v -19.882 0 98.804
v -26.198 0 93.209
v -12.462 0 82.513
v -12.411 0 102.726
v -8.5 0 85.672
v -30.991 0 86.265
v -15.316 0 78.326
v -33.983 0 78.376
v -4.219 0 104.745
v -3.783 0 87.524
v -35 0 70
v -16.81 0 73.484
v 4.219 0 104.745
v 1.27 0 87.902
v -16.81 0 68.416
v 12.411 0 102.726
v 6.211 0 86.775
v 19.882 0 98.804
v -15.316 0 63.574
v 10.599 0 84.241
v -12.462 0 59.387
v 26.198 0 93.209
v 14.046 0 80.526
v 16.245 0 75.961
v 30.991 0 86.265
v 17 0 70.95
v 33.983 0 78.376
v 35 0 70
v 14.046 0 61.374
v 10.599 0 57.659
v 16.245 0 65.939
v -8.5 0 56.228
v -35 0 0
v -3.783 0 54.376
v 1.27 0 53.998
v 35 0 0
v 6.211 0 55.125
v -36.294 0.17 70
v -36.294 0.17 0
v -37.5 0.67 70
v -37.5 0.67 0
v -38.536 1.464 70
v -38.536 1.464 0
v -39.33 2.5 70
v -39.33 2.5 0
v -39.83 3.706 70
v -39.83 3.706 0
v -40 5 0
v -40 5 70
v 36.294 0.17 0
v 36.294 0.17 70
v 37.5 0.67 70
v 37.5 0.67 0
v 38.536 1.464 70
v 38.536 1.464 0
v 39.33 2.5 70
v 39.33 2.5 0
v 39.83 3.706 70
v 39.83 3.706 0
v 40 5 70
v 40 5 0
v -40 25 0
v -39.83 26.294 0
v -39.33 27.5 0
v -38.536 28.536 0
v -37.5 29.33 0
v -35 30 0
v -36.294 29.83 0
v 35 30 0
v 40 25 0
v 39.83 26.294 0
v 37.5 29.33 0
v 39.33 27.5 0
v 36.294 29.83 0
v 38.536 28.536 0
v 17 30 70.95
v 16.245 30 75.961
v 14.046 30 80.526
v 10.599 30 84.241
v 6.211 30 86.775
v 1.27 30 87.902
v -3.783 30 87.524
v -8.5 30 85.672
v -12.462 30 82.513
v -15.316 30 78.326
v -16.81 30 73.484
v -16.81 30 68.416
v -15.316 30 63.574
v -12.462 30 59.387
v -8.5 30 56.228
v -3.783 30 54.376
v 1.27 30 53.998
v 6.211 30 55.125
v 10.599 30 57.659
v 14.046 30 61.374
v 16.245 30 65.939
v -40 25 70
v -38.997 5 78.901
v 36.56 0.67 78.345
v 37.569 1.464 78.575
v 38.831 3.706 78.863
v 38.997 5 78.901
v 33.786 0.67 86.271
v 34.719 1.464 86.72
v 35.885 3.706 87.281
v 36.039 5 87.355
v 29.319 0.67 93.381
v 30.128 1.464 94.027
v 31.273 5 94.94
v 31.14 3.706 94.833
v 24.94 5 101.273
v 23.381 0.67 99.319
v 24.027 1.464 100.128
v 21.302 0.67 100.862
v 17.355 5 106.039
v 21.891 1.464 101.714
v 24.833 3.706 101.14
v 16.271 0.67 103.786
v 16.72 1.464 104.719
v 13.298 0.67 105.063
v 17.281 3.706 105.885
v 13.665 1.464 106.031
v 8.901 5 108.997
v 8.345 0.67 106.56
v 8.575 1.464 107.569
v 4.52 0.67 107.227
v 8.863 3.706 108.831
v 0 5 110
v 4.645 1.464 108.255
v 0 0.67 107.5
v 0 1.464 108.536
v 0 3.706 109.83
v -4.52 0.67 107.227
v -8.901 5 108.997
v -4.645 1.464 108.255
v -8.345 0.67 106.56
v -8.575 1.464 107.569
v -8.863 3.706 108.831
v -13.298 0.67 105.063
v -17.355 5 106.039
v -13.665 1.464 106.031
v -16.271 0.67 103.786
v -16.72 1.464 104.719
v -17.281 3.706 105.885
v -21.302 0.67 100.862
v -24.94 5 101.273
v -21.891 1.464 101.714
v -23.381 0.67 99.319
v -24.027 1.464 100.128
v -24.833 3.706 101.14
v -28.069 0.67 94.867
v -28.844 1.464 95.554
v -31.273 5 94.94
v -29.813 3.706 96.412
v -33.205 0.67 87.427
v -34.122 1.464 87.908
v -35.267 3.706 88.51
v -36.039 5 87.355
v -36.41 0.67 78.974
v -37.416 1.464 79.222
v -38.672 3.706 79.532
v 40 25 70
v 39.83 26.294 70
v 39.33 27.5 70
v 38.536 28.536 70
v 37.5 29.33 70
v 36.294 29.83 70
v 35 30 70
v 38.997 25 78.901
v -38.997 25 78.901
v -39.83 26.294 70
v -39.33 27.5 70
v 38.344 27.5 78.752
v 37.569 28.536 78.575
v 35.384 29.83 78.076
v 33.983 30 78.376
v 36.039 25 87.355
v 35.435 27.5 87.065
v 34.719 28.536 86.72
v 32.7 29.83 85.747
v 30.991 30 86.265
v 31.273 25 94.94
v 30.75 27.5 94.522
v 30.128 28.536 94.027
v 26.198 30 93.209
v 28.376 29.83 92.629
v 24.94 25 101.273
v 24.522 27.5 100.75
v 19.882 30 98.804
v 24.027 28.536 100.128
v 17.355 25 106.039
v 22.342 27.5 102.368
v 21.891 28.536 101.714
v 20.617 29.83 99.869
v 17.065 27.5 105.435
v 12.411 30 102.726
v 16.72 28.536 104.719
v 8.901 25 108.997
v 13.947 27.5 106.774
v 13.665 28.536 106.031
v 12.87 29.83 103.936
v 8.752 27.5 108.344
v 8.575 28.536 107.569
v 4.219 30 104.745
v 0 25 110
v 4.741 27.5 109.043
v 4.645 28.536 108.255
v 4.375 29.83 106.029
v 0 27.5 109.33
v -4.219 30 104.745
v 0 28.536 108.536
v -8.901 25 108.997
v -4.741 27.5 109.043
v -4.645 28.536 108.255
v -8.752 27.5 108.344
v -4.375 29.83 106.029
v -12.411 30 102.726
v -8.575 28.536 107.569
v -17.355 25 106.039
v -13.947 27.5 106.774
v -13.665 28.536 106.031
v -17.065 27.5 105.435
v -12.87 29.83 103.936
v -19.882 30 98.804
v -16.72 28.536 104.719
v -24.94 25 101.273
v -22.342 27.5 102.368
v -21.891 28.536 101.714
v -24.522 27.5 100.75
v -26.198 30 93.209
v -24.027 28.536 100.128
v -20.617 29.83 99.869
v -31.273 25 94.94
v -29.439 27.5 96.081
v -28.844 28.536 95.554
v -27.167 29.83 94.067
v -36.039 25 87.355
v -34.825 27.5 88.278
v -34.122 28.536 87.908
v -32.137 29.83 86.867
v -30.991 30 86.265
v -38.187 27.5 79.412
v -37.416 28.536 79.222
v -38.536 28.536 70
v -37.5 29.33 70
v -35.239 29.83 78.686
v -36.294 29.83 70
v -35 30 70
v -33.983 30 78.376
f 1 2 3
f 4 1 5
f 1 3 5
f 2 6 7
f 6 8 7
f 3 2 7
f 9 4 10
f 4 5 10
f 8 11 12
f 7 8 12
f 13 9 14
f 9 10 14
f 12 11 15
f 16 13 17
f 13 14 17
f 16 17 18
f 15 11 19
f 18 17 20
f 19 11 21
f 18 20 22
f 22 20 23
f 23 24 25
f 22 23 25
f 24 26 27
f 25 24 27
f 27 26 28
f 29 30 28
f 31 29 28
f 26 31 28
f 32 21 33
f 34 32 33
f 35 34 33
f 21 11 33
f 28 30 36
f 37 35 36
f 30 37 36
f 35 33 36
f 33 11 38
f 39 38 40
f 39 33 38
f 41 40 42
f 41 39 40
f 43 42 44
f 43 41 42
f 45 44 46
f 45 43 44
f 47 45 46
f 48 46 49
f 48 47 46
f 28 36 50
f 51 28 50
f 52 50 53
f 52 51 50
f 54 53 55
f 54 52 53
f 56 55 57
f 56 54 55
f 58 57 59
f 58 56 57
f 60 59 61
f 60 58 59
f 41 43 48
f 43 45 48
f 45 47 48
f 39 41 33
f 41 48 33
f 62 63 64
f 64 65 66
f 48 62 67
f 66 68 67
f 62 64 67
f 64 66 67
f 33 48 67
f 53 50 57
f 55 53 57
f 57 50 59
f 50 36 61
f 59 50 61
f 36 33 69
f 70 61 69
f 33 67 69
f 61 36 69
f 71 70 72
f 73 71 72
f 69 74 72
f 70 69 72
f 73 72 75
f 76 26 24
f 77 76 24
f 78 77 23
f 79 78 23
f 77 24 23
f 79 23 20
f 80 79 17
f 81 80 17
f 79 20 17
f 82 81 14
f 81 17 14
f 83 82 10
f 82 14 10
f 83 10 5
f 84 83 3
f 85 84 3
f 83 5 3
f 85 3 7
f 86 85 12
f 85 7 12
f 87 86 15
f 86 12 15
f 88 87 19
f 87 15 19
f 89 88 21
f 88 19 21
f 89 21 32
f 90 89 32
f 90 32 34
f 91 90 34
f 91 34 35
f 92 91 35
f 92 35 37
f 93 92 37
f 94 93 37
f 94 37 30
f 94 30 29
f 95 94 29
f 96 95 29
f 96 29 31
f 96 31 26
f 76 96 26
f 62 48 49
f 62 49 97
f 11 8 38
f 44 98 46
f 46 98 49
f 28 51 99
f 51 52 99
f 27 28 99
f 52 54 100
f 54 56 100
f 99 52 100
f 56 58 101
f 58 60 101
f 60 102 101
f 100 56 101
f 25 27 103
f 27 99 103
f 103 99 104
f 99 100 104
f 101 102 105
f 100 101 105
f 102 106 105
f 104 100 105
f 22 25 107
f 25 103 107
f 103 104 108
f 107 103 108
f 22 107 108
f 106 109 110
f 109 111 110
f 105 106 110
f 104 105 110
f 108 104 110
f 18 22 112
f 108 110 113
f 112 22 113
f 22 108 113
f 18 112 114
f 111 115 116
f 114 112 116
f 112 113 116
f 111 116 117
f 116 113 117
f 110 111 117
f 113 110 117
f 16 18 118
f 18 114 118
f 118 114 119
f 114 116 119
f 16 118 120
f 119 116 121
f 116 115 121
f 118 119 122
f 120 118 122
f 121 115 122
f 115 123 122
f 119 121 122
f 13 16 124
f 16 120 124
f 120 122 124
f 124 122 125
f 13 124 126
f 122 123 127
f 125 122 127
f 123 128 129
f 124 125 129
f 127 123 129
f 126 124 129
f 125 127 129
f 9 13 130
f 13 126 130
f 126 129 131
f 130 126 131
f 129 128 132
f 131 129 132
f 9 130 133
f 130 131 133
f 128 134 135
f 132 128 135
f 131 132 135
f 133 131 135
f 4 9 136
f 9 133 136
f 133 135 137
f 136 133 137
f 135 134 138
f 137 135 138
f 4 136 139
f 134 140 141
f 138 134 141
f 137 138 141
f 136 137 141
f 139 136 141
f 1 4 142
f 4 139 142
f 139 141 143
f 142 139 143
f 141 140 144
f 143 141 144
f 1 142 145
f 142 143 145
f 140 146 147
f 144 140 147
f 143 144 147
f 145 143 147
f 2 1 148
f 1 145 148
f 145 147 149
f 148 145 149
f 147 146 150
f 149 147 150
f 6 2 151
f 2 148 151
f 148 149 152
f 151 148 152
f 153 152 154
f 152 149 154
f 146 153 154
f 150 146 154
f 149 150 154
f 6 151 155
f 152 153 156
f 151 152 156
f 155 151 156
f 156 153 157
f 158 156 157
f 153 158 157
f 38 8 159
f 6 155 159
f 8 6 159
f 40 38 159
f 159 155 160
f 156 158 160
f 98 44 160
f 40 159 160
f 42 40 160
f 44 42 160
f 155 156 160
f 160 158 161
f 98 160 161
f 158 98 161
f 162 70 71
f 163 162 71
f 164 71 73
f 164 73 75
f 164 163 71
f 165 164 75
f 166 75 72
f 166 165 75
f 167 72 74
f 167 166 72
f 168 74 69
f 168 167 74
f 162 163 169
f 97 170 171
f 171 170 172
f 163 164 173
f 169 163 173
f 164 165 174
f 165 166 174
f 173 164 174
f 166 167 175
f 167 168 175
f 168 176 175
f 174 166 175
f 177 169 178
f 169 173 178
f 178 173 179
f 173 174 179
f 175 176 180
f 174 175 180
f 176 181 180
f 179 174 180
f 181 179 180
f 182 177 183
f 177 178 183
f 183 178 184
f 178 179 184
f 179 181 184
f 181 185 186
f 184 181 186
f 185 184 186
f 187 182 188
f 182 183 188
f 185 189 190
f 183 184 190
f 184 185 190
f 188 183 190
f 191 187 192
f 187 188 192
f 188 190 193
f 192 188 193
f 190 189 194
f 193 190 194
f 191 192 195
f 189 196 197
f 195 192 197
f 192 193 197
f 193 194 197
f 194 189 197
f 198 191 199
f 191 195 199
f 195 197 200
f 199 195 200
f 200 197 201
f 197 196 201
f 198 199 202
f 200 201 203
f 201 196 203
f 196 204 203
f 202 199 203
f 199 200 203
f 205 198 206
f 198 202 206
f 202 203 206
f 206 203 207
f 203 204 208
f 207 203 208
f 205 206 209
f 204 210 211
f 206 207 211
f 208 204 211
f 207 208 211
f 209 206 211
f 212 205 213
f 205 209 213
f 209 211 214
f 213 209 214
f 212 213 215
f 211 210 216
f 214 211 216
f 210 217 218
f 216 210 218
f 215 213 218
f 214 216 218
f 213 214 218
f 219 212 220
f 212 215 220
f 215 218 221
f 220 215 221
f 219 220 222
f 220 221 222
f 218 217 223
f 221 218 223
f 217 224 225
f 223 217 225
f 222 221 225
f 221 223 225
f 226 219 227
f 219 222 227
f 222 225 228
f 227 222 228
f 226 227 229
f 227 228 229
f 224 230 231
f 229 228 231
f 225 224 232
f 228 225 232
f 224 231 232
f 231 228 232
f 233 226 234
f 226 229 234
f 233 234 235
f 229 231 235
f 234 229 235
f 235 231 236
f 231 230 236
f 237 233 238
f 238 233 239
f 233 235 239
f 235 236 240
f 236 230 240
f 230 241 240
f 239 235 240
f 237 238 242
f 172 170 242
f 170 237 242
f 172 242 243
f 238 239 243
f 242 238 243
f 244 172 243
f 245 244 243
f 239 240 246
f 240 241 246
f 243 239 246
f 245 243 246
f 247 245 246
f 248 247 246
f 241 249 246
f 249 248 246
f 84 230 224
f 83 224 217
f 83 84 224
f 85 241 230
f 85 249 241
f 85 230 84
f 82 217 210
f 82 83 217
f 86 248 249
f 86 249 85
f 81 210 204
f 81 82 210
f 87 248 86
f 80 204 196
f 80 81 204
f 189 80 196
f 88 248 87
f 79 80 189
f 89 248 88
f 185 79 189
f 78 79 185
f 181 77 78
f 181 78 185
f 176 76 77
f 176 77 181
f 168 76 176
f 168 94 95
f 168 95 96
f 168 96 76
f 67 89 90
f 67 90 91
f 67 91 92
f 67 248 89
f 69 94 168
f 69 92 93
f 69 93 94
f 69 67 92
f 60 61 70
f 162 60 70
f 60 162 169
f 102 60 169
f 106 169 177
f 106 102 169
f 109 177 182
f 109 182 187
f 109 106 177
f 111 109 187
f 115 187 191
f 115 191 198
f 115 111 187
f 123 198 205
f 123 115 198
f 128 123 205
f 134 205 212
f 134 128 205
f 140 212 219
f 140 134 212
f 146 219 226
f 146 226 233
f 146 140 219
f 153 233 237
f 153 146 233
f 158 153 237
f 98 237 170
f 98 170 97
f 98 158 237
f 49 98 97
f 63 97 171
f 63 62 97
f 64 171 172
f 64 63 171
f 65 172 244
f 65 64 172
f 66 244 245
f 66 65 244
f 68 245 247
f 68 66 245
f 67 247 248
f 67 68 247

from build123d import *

# Parameters (mm, degrees)
SKETCH1_W           = 80
SKETCH1_H           = 30
BOSS_EXTRUDE1_DEPTH = 110
FILLET1_RADIUS      = 40
FILLET1_LENGTH      = 30
FILLET2_R           = 5
CUT_EXTRUDE1_REACH  = 122.83
SKETCH2_R           = 17


with BuildPart() as part:
    # Sketch1 → Boss-Extrude1 (new body)
    with BuildSketch(Plane.XY):
        with Locations((0, 15)):
            Rectangle(SKETCH1_W, SKETCH1_H)
    extrude(amount=BOSS_EXTRUDE1_DEPTH)

    # Fillet1: full round fillet: the end face becomes a half cylinder, R = half its width
    fillet1_face = Plane((0, 15, 110), x_dir=(0, -1, 0), z_dir=(0, 0, 1))  # on the end face: x along it, z out of the body
    fillet1_slab = fillet1_face.offset(-FILLET1_RADIUS / 2) * Box(FILLET1_LENGTH, 2 * FILLET1_RADIUS, FILLET1_RADIUS, mode=Mode.PRIVATE)  # the body's end, R deep
    fillet1_round = Plane((0, 15, 70), x_dir=(0, 0, 1), z_dir=(0, -1, 0)) * Cylinder(FILLET1_RADIUS, FILLET1_LENGTH, mode=Mode.PRIVATE)  # its axis R under the face
    add(fillet1_slab - fillet1_round, mode=Mode.SUBTRACT)

    # Fillet2
    fillet2_edges = [part.edges().sort_by_distance(p)[0] for p in [
        (40, 30, 35),
        (40, 0, 35),
        (-40, 0, 35),
        (-40, 30, 35),
        (0, 30, 110),
        (0, 0, 110),
    ]]
    fillet(fillet2_edges, radius=FILLET2_R)

    # Sketch2 → Cut-Extrude1 (cut, up to next)
    with BuildSketch(Plane.XZ, mode=Mode.PRIVATE) as cut_extrude1_sk1:
        with Locations((0, 70.95)):
            Circle(SKETCH2_R)
    cut_extrude1_tool1 = extrude(cut_extrude1_sk1.sketch, amount=-CUT_EXTRUDE1_REACH, mode=Mode.PRIVATE) & part.part
    add(cut_extrude1_tool1.solids().sort_by_distance((0, 0, 70.95))[0], mode=Mode.SUBTRACT)


solid = part.part
